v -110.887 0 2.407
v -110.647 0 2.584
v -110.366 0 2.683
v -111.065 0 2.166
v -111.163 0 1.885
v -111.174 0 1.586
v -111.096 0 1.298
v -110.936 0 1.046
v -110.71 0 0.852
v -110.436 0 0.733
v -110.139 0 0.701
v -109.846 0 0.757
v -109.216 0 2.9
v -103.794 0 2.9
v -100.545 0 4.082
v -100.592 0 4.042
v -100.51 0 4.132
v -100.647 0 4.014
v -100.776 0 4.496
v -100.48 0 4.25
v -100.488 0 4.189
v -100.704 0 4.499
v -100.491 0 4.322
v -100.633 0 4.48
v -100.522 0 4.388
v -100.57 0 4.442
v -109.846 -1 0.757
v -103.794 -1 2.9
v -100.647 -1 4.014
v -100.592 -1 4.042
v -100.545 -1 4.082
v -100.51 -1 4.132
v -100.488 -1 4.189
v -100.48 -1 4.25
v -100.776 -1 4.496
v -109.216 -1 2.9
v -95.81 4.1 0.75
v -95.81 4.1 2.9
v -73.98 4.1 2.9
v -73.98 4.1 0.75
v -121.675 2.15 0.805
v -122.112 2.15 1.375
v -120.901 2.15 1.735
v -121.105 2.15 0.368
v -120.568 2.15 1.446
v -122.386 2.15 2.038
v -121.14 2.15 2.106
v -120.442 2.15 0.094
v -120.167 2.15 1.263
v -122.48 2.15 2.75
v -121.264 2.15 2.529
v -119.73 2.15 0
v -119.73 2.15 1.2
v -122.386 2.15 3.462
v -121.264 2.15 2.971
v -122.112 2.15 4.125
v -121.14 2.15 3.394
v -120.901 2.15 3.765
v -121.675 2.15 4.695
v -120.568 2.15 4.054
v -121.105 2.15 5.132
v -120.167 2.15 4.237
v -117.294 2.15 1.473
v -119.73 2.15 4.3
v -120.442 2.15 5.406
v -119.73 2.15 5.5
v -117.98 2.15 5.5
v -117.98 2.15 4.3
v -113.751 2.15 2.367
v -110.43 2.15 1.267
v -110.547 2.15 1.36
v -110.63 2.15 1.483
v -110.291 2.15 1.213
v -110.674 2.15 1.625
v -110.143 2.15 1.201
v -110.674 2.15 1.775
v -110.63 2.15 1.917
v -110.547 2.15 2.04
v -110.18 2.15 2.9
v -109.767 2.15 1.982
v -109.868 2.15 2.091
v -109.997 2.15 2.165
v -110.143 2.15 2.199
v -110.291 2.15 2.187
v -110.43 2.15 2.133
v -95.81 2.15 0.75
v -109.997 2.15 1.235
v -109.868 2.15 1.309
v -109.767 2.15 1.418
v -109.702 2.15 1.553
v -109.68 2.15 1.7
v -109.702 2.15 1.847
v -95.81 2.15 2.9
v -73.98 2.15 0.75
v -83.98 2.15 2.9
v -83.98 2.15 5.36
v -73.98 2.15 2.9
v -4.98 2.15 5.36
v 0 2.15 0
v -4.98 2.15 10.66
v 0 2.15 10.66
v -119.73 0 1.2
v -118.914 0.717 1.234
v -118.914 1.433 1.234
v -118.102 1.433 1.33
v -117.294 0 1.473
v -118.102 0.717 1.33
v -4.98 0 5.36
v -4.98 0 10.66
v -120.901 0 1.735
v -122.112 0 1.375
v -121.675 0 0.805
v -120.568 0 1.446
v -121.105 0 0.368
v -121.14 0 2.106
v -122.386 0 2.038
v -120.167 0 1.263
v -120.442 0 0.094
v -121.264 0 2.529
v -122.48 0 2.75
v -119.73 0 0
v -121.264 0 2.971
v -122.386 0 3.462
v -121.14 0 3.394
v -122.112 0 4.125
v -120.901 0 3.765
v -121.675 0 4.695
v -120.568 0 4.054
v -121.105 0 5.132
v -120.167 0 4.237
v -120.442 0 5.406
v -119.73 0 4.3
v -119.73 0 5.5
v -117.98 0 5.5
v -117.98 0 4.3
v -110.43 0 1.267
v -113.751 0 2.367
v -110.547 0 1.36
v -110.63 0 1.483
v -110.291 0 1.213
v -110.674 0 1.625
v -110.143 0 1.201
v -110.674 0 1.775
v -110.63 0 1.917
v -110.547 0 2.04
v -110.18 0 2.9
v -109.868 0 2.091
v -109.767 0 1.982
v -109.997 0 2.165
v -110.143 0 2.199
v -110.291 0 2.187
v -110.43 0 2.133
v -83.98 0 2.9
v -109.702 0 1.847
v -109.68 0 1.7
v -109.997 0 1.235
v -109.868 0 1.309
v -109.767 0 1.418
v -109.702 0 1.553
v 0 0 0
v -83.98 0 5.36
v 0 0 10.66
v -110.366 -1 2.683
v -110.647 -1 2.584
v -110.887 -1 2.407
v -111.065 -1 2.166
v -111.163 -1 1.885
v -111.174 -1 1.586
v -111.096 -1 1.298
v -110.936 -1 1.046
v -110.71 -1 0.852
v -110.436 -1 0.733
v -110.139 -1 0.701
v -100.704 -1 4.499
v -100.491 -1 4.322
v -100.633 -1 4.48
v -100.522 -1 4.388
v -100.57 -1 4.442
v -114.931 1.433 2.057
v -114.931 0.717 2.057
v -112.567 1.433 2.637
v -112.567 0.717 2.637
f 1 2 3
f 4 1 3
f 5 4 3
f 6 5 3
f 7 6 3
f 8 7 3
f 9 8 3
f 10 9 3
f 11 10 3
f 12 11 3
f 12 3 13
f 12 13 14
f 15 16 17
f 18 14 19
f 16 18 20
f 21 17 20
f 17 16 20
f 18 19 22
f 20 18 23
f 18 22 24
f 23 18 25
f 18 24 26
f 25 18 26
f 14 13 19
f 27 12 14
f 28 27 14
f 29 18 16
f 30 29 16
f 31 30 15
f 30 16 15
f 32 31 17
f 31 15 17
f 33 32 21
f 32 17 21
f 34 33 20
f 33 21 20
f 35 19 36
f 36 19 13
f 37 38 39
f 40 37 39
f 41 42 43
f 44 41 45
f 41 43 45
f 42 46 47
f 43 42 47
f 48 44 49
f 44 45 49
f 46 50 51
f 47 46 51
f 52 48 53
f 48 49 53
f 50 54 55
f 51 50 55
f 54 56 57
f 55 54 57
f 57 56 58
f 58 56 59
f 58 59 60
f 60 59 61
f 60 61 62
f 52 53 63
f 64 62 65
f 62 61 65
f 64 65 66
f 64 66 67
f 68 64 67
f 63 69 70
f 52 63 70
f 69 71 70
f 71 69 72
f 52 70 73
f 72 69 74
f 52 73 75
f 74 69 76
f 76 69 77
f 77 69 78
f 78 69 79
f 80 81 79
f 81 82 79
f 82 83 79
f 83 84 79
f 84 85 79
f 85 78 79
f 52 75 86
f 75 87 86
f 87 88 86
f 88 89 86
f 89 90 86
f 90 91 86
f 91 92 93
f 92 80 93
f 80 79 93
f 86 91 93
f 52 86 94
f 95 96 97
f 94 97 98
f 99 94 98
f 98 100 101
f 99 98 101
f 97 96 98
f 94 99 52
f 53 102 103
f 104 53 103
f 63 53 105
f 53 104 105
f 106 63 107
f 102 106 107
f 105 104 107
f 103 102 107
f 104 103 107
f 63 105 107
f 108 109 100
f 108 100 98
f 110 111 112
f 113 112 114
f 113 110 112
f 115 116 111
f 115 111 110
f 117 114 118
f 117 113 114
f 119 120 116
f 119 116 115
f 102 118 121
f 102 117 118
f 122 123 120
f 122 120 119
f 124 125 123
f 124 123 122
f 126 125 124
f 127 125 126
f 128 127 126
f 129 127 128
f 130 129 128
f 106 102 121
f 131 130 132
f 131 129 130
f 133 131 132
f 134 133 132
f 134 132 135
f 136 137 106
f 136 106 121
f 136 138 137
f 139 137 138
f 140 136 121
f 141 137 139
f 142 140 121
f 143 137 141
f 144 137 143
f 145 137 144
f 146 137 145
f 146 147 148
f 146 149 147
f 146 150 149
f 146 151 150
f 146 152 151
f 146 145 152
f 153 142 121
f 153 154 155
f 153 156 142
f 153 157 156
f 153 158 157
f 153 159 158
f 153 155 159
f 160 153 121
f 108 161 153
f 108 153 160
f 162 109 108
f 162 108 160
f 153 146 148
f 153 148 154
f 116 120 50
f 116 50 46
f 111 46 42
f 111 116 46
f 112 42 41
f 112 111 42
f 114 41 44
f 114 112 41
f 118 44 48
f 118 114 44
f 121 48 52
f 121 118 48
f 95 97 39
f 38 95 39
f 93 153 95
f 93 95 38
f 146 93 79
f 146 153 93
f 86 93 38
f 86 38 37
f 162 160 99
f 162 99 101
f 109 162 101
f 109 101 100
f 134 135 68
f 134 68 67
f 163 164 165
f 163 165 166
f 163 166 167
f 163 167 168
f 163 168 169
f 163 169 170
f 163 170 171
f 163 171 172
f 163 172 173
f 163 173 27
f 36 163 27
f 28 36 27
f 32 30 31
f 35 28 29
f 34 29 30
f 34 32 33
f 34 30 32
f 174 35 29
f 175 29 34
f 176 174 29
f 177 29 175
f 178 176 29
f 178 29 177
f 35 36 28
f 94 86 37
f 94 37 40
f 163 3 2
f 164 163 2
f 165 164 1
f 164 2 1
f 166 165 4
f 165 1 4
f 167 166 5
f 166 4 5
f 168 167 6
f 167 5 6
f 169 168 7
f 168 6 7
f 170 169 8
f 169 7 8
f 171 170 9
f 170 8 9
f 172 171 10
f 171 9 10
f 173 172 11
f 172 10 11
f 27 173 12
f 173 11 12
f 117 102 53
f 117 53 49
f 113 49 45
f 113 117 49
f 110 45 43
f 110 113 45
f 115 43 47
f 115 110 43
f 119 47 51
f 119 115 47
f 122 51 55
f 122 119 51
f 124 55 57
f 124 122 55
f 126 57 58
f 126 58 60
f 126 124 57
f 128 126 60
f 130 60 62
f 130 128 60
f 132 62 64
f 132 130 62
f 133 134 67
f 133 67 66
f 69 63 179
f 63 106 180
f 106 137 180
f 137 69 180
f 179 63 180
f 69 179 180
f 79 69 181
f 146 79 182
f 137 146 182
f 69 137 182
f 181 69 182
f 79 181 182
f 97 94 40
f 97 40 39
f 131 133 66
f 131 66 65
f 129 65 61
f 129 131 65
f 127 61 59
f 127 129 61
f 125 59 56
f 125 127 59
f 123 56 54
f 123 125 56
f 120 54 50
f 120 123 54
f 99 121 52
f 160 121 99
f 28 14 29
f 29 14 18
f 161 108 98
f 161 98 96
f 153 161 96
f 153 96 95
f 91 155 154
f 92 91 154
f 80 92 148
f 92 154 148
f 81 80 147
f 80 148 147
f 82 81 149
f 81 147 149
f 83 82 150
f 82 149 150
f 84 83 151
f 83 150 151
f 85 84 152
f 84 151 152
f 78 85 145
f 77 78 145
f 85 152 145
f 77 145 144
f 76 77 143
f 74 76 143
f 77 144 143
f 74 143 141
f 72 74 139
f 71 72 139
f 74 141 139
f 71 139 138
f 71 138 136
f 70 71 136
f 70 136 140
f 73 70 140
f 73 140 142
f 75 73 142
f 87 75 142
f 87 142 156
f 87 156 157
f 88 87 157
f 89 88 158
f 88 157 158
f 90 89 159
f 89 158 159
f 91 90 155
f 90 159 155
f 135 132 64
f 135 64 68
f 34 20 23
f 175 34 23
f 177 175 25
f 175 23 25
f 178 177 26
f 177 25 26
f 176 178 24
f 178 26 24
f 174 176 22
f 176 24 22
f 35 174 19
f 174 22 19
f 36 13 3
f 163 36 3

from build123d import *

# Parameters (mm, degrees)
F0_R     = 0.5
F1_DEPTH = 2.15
F2_DEPTH = 4.1
F3_DEPTH = 1


with BuildPart() as f1:
    # F0 (on Front) → F1 (new body)
    with BuildSketch(Plane.XZ):
        with BuildLine():
            Line((0, 10.66), (-4.98, 10.66))
            Line((-4.98, 10.66), (-4.98, 5.36))
            Line((-4.98, 5.36), (-83.98, 5.36))
            Line((-83.98, 5.36), (-83.98, 2.9))
            Line((-83.98, 2.9), (-73.98, 2.9))
            Line((-73.98, 2.9), (-73.98, 0.75))
            Line((-73.98, 0.75), (-95.81, 0.75))
            Line((-95.81, 0.75), (-95.81, 2.9))
            Line((-95.81, 2.9), (-103.7941037767, 2.9))
            Line((-103.7941037767, 2.9), (-109.8462645235, 0.757333234))
            ThreePointArc((-109.8462645235, 0.757333234), (-111.1454676377, 1.4394769866), (-110.3657786893, 2.6825916133))
            Line((-110.3657786893, 2.6825916133), (-109.2158962233, 2.9))
            Line((-109.2158962233, 2.9), (-110.18, 2.9))
            add(Edge.make_bspline(
                [(-117.2944879845, 1.4729795529), (-114.9234880226, 1.9534816653), (-112.5864989427, 2.9), (-110.18, 2.9)],
                knots=[2.4621458667, 2.4621458667, 2.4621458667, 2.4621458667, 9.7001288651, 9.7001288651, 9.7001288651, 9.7001288651], degree=3))
            ThreePointArc((-117.2944879845, 1.4729795529), (-118.3068531751, 0.3968843813), (-119.73, 0))
            Line((-119.73, 0), (0, 0))
            Line((0, 0), (0, 10.66))
        make_face()
        with BuildLine():
            ThreePointArc((-119.73, 5.5), (-121.6745436483, 4.6945436483), (-122.48, 2.75))
            ThreePointArc((-122.48, 2.75), (-121.6745436483, 0.8054563517), (-119.73, 0))
            ThreePointArc((-119.73, 0), (-118.3068531751, 0.3968843813), (-117.2944879845, 1.4729795529))
            add(Edge.make_bspline(
                [(-119.73, 1.2), (-118.9115104728, 1.2), (-118.1010314314, 1.3095270702), (-117.2944879845, 1.4729795529)],
                knots=[0, 0, 0, 0, 2.4621458667, 2.4621458667, 2.4621458667, 2.4621458667], degree=3))
            ThreePointArc((-119.73, 1.2), (-121.28, 2.75), (-119.73, 4.3))
            Line((-119.73, 4.3), (-117.98, 4.3))
            Line((-117.98, 4.3), (-117.98, 4.8713203436))
            ThreePointArc((-117.98, 4.8713203436), (-118.8002502877, 5.3380621075), (-119.73, 5.5))
        make_face()
        with BuildLine():
            Line((-117.98, 5.5), (-119.73, 5.5))
            ThreePointArc((-119.73, 5.5), (-118.8002502877, 5.3380621075), (-117.98, 4.8713203436))
            Line((-117.98, 4.8713203436), (-117.98, 5.5))
        make_face()
        with BuildLine():
            Line((-103.7941037767, 2.9), (-109.2158962233, 2.9))
            Line((-109.2158962233, 2.9), (-110.3657786893, 2.6825916133))
            ThreePointArc((-110.3657786893, 2.6825916133), (-109.5419477644, 2.4699930809), (-109.18, 1.7))
            ThreePointArc((-109.18, 1.7), (-109.3633802976, 1.1228238902), (-109.8462645235, 0.757333234))
            Line((-109.8462645235, 0.757333234), (-103.7941037767, 2.9))
        make_face()
        with BuildLine():
            ThreePointArc((-109.18, 1.7), (-109.5419477644, 2.4699930809), (-110.3657786893, 2.6825916133))
            ThreePointArc((-110.3657786893, 2.6825916133), (-111.1454676377, 1.4394769866), (-109.8462645235, 0.757333234))
            ThreePointArc((-109.8462645235, 0.757333234), (-109.3633802976, 1.1228238902), (-109.18, 1.7))
        make_face()
        with Locations((-110.18, 1.7)):
            Circle(F0_R, mode=Mode.SUBTRACT)
    extrude(amount=-F1_DEPTH)

    # F0 (on Front) → F2 (join)
    with BuildSketch(Plane.XZ):
        Polygon((-73.98, 2.9), (-83.98, 2.9), (-95.81, 2.9), (-95.81, 0.75), (-73.98, 0.75), align=None)
    extrude(amount=-F2_DEPTH)


with BuildPart() as f3:
    # F0 (on Front) → F3 (new body)
    with BuildSketch(Plane.XZ):
        with BuildLine():
            ThreePointArc((-109.18, 1.7), (-109.5419477644, 2.4699930809), (-110.3657786893, 2.6825916133))
            ThreePointArc((-110.3657786893, 2.6825916133), (-111.1454676377, 1.4394769866), (-109.8462645235, 0.757333234))
            ThreePointArc((-109.8462645235, 0.757333234), (-109.3633802976, 1.1228238902), (-109.18, 1.7))
        make_face()
        with Locations((-110.18, 1.7)):
            Circle(F0_R, mode=Mode.SUBTRACT)
        with BuildLine():
            Line((-103.7941037767, 2.9), (-109.2158962233, 2.9))
            Line((-109.2158962233, 2.9), (-110.3657786893, 2.6825916133))
            ThreePointArc((-110.3657786893, 2.6825916133), (-109.5419477644, 2.4699930809), (-109.18, 1.7))
            ThreePointArc((-109.18, 1.7), (-109.3633802976, 1.1228238902), (-109.8462645235, 0.757333234))
            Line((-109.8462645235, 0.757333234), (-103.7941037767, 2.9))
        make_face()
        with BuildLine():
            Line((-100.7764446723, 4.4956479033), (-109.2158962233, 2.9))
            Line((-109.2158962233, 2.9), (-103.7941037767, 2.9))
            Line((-103.7941037767, 2.9), (-100.6465661309, 4.0143333085))
            ThreePointArc((-100.6465661309, 4.0143333085), (-100.9713669094, 4.1848692467), (-100.7764446723, 4.4956479033))
        make_face()
        with BuildLine():
            ThreePointArc((-100.48, 4.25), (-100.5704869411, 4.4424982702), (-100.7764446723, 4.4956479033))
            ThreePointArc((-100.7764446723, 4.4956479033), (-100.9713669094, 4.1848692467), (-100.6465661309, 4.0143333085))
            ThreePointArc((-100.6465661309, 4.0143333085), (-100.5258450744, 4.1057059725), (-100.48, 4.25))
        make_face()
        with Locations((-110.18, 1.7)):
            Circle(F0_R)
    extrude(amount=F3_DEPTH)


solid = Compound([f1.part, f3.part])
